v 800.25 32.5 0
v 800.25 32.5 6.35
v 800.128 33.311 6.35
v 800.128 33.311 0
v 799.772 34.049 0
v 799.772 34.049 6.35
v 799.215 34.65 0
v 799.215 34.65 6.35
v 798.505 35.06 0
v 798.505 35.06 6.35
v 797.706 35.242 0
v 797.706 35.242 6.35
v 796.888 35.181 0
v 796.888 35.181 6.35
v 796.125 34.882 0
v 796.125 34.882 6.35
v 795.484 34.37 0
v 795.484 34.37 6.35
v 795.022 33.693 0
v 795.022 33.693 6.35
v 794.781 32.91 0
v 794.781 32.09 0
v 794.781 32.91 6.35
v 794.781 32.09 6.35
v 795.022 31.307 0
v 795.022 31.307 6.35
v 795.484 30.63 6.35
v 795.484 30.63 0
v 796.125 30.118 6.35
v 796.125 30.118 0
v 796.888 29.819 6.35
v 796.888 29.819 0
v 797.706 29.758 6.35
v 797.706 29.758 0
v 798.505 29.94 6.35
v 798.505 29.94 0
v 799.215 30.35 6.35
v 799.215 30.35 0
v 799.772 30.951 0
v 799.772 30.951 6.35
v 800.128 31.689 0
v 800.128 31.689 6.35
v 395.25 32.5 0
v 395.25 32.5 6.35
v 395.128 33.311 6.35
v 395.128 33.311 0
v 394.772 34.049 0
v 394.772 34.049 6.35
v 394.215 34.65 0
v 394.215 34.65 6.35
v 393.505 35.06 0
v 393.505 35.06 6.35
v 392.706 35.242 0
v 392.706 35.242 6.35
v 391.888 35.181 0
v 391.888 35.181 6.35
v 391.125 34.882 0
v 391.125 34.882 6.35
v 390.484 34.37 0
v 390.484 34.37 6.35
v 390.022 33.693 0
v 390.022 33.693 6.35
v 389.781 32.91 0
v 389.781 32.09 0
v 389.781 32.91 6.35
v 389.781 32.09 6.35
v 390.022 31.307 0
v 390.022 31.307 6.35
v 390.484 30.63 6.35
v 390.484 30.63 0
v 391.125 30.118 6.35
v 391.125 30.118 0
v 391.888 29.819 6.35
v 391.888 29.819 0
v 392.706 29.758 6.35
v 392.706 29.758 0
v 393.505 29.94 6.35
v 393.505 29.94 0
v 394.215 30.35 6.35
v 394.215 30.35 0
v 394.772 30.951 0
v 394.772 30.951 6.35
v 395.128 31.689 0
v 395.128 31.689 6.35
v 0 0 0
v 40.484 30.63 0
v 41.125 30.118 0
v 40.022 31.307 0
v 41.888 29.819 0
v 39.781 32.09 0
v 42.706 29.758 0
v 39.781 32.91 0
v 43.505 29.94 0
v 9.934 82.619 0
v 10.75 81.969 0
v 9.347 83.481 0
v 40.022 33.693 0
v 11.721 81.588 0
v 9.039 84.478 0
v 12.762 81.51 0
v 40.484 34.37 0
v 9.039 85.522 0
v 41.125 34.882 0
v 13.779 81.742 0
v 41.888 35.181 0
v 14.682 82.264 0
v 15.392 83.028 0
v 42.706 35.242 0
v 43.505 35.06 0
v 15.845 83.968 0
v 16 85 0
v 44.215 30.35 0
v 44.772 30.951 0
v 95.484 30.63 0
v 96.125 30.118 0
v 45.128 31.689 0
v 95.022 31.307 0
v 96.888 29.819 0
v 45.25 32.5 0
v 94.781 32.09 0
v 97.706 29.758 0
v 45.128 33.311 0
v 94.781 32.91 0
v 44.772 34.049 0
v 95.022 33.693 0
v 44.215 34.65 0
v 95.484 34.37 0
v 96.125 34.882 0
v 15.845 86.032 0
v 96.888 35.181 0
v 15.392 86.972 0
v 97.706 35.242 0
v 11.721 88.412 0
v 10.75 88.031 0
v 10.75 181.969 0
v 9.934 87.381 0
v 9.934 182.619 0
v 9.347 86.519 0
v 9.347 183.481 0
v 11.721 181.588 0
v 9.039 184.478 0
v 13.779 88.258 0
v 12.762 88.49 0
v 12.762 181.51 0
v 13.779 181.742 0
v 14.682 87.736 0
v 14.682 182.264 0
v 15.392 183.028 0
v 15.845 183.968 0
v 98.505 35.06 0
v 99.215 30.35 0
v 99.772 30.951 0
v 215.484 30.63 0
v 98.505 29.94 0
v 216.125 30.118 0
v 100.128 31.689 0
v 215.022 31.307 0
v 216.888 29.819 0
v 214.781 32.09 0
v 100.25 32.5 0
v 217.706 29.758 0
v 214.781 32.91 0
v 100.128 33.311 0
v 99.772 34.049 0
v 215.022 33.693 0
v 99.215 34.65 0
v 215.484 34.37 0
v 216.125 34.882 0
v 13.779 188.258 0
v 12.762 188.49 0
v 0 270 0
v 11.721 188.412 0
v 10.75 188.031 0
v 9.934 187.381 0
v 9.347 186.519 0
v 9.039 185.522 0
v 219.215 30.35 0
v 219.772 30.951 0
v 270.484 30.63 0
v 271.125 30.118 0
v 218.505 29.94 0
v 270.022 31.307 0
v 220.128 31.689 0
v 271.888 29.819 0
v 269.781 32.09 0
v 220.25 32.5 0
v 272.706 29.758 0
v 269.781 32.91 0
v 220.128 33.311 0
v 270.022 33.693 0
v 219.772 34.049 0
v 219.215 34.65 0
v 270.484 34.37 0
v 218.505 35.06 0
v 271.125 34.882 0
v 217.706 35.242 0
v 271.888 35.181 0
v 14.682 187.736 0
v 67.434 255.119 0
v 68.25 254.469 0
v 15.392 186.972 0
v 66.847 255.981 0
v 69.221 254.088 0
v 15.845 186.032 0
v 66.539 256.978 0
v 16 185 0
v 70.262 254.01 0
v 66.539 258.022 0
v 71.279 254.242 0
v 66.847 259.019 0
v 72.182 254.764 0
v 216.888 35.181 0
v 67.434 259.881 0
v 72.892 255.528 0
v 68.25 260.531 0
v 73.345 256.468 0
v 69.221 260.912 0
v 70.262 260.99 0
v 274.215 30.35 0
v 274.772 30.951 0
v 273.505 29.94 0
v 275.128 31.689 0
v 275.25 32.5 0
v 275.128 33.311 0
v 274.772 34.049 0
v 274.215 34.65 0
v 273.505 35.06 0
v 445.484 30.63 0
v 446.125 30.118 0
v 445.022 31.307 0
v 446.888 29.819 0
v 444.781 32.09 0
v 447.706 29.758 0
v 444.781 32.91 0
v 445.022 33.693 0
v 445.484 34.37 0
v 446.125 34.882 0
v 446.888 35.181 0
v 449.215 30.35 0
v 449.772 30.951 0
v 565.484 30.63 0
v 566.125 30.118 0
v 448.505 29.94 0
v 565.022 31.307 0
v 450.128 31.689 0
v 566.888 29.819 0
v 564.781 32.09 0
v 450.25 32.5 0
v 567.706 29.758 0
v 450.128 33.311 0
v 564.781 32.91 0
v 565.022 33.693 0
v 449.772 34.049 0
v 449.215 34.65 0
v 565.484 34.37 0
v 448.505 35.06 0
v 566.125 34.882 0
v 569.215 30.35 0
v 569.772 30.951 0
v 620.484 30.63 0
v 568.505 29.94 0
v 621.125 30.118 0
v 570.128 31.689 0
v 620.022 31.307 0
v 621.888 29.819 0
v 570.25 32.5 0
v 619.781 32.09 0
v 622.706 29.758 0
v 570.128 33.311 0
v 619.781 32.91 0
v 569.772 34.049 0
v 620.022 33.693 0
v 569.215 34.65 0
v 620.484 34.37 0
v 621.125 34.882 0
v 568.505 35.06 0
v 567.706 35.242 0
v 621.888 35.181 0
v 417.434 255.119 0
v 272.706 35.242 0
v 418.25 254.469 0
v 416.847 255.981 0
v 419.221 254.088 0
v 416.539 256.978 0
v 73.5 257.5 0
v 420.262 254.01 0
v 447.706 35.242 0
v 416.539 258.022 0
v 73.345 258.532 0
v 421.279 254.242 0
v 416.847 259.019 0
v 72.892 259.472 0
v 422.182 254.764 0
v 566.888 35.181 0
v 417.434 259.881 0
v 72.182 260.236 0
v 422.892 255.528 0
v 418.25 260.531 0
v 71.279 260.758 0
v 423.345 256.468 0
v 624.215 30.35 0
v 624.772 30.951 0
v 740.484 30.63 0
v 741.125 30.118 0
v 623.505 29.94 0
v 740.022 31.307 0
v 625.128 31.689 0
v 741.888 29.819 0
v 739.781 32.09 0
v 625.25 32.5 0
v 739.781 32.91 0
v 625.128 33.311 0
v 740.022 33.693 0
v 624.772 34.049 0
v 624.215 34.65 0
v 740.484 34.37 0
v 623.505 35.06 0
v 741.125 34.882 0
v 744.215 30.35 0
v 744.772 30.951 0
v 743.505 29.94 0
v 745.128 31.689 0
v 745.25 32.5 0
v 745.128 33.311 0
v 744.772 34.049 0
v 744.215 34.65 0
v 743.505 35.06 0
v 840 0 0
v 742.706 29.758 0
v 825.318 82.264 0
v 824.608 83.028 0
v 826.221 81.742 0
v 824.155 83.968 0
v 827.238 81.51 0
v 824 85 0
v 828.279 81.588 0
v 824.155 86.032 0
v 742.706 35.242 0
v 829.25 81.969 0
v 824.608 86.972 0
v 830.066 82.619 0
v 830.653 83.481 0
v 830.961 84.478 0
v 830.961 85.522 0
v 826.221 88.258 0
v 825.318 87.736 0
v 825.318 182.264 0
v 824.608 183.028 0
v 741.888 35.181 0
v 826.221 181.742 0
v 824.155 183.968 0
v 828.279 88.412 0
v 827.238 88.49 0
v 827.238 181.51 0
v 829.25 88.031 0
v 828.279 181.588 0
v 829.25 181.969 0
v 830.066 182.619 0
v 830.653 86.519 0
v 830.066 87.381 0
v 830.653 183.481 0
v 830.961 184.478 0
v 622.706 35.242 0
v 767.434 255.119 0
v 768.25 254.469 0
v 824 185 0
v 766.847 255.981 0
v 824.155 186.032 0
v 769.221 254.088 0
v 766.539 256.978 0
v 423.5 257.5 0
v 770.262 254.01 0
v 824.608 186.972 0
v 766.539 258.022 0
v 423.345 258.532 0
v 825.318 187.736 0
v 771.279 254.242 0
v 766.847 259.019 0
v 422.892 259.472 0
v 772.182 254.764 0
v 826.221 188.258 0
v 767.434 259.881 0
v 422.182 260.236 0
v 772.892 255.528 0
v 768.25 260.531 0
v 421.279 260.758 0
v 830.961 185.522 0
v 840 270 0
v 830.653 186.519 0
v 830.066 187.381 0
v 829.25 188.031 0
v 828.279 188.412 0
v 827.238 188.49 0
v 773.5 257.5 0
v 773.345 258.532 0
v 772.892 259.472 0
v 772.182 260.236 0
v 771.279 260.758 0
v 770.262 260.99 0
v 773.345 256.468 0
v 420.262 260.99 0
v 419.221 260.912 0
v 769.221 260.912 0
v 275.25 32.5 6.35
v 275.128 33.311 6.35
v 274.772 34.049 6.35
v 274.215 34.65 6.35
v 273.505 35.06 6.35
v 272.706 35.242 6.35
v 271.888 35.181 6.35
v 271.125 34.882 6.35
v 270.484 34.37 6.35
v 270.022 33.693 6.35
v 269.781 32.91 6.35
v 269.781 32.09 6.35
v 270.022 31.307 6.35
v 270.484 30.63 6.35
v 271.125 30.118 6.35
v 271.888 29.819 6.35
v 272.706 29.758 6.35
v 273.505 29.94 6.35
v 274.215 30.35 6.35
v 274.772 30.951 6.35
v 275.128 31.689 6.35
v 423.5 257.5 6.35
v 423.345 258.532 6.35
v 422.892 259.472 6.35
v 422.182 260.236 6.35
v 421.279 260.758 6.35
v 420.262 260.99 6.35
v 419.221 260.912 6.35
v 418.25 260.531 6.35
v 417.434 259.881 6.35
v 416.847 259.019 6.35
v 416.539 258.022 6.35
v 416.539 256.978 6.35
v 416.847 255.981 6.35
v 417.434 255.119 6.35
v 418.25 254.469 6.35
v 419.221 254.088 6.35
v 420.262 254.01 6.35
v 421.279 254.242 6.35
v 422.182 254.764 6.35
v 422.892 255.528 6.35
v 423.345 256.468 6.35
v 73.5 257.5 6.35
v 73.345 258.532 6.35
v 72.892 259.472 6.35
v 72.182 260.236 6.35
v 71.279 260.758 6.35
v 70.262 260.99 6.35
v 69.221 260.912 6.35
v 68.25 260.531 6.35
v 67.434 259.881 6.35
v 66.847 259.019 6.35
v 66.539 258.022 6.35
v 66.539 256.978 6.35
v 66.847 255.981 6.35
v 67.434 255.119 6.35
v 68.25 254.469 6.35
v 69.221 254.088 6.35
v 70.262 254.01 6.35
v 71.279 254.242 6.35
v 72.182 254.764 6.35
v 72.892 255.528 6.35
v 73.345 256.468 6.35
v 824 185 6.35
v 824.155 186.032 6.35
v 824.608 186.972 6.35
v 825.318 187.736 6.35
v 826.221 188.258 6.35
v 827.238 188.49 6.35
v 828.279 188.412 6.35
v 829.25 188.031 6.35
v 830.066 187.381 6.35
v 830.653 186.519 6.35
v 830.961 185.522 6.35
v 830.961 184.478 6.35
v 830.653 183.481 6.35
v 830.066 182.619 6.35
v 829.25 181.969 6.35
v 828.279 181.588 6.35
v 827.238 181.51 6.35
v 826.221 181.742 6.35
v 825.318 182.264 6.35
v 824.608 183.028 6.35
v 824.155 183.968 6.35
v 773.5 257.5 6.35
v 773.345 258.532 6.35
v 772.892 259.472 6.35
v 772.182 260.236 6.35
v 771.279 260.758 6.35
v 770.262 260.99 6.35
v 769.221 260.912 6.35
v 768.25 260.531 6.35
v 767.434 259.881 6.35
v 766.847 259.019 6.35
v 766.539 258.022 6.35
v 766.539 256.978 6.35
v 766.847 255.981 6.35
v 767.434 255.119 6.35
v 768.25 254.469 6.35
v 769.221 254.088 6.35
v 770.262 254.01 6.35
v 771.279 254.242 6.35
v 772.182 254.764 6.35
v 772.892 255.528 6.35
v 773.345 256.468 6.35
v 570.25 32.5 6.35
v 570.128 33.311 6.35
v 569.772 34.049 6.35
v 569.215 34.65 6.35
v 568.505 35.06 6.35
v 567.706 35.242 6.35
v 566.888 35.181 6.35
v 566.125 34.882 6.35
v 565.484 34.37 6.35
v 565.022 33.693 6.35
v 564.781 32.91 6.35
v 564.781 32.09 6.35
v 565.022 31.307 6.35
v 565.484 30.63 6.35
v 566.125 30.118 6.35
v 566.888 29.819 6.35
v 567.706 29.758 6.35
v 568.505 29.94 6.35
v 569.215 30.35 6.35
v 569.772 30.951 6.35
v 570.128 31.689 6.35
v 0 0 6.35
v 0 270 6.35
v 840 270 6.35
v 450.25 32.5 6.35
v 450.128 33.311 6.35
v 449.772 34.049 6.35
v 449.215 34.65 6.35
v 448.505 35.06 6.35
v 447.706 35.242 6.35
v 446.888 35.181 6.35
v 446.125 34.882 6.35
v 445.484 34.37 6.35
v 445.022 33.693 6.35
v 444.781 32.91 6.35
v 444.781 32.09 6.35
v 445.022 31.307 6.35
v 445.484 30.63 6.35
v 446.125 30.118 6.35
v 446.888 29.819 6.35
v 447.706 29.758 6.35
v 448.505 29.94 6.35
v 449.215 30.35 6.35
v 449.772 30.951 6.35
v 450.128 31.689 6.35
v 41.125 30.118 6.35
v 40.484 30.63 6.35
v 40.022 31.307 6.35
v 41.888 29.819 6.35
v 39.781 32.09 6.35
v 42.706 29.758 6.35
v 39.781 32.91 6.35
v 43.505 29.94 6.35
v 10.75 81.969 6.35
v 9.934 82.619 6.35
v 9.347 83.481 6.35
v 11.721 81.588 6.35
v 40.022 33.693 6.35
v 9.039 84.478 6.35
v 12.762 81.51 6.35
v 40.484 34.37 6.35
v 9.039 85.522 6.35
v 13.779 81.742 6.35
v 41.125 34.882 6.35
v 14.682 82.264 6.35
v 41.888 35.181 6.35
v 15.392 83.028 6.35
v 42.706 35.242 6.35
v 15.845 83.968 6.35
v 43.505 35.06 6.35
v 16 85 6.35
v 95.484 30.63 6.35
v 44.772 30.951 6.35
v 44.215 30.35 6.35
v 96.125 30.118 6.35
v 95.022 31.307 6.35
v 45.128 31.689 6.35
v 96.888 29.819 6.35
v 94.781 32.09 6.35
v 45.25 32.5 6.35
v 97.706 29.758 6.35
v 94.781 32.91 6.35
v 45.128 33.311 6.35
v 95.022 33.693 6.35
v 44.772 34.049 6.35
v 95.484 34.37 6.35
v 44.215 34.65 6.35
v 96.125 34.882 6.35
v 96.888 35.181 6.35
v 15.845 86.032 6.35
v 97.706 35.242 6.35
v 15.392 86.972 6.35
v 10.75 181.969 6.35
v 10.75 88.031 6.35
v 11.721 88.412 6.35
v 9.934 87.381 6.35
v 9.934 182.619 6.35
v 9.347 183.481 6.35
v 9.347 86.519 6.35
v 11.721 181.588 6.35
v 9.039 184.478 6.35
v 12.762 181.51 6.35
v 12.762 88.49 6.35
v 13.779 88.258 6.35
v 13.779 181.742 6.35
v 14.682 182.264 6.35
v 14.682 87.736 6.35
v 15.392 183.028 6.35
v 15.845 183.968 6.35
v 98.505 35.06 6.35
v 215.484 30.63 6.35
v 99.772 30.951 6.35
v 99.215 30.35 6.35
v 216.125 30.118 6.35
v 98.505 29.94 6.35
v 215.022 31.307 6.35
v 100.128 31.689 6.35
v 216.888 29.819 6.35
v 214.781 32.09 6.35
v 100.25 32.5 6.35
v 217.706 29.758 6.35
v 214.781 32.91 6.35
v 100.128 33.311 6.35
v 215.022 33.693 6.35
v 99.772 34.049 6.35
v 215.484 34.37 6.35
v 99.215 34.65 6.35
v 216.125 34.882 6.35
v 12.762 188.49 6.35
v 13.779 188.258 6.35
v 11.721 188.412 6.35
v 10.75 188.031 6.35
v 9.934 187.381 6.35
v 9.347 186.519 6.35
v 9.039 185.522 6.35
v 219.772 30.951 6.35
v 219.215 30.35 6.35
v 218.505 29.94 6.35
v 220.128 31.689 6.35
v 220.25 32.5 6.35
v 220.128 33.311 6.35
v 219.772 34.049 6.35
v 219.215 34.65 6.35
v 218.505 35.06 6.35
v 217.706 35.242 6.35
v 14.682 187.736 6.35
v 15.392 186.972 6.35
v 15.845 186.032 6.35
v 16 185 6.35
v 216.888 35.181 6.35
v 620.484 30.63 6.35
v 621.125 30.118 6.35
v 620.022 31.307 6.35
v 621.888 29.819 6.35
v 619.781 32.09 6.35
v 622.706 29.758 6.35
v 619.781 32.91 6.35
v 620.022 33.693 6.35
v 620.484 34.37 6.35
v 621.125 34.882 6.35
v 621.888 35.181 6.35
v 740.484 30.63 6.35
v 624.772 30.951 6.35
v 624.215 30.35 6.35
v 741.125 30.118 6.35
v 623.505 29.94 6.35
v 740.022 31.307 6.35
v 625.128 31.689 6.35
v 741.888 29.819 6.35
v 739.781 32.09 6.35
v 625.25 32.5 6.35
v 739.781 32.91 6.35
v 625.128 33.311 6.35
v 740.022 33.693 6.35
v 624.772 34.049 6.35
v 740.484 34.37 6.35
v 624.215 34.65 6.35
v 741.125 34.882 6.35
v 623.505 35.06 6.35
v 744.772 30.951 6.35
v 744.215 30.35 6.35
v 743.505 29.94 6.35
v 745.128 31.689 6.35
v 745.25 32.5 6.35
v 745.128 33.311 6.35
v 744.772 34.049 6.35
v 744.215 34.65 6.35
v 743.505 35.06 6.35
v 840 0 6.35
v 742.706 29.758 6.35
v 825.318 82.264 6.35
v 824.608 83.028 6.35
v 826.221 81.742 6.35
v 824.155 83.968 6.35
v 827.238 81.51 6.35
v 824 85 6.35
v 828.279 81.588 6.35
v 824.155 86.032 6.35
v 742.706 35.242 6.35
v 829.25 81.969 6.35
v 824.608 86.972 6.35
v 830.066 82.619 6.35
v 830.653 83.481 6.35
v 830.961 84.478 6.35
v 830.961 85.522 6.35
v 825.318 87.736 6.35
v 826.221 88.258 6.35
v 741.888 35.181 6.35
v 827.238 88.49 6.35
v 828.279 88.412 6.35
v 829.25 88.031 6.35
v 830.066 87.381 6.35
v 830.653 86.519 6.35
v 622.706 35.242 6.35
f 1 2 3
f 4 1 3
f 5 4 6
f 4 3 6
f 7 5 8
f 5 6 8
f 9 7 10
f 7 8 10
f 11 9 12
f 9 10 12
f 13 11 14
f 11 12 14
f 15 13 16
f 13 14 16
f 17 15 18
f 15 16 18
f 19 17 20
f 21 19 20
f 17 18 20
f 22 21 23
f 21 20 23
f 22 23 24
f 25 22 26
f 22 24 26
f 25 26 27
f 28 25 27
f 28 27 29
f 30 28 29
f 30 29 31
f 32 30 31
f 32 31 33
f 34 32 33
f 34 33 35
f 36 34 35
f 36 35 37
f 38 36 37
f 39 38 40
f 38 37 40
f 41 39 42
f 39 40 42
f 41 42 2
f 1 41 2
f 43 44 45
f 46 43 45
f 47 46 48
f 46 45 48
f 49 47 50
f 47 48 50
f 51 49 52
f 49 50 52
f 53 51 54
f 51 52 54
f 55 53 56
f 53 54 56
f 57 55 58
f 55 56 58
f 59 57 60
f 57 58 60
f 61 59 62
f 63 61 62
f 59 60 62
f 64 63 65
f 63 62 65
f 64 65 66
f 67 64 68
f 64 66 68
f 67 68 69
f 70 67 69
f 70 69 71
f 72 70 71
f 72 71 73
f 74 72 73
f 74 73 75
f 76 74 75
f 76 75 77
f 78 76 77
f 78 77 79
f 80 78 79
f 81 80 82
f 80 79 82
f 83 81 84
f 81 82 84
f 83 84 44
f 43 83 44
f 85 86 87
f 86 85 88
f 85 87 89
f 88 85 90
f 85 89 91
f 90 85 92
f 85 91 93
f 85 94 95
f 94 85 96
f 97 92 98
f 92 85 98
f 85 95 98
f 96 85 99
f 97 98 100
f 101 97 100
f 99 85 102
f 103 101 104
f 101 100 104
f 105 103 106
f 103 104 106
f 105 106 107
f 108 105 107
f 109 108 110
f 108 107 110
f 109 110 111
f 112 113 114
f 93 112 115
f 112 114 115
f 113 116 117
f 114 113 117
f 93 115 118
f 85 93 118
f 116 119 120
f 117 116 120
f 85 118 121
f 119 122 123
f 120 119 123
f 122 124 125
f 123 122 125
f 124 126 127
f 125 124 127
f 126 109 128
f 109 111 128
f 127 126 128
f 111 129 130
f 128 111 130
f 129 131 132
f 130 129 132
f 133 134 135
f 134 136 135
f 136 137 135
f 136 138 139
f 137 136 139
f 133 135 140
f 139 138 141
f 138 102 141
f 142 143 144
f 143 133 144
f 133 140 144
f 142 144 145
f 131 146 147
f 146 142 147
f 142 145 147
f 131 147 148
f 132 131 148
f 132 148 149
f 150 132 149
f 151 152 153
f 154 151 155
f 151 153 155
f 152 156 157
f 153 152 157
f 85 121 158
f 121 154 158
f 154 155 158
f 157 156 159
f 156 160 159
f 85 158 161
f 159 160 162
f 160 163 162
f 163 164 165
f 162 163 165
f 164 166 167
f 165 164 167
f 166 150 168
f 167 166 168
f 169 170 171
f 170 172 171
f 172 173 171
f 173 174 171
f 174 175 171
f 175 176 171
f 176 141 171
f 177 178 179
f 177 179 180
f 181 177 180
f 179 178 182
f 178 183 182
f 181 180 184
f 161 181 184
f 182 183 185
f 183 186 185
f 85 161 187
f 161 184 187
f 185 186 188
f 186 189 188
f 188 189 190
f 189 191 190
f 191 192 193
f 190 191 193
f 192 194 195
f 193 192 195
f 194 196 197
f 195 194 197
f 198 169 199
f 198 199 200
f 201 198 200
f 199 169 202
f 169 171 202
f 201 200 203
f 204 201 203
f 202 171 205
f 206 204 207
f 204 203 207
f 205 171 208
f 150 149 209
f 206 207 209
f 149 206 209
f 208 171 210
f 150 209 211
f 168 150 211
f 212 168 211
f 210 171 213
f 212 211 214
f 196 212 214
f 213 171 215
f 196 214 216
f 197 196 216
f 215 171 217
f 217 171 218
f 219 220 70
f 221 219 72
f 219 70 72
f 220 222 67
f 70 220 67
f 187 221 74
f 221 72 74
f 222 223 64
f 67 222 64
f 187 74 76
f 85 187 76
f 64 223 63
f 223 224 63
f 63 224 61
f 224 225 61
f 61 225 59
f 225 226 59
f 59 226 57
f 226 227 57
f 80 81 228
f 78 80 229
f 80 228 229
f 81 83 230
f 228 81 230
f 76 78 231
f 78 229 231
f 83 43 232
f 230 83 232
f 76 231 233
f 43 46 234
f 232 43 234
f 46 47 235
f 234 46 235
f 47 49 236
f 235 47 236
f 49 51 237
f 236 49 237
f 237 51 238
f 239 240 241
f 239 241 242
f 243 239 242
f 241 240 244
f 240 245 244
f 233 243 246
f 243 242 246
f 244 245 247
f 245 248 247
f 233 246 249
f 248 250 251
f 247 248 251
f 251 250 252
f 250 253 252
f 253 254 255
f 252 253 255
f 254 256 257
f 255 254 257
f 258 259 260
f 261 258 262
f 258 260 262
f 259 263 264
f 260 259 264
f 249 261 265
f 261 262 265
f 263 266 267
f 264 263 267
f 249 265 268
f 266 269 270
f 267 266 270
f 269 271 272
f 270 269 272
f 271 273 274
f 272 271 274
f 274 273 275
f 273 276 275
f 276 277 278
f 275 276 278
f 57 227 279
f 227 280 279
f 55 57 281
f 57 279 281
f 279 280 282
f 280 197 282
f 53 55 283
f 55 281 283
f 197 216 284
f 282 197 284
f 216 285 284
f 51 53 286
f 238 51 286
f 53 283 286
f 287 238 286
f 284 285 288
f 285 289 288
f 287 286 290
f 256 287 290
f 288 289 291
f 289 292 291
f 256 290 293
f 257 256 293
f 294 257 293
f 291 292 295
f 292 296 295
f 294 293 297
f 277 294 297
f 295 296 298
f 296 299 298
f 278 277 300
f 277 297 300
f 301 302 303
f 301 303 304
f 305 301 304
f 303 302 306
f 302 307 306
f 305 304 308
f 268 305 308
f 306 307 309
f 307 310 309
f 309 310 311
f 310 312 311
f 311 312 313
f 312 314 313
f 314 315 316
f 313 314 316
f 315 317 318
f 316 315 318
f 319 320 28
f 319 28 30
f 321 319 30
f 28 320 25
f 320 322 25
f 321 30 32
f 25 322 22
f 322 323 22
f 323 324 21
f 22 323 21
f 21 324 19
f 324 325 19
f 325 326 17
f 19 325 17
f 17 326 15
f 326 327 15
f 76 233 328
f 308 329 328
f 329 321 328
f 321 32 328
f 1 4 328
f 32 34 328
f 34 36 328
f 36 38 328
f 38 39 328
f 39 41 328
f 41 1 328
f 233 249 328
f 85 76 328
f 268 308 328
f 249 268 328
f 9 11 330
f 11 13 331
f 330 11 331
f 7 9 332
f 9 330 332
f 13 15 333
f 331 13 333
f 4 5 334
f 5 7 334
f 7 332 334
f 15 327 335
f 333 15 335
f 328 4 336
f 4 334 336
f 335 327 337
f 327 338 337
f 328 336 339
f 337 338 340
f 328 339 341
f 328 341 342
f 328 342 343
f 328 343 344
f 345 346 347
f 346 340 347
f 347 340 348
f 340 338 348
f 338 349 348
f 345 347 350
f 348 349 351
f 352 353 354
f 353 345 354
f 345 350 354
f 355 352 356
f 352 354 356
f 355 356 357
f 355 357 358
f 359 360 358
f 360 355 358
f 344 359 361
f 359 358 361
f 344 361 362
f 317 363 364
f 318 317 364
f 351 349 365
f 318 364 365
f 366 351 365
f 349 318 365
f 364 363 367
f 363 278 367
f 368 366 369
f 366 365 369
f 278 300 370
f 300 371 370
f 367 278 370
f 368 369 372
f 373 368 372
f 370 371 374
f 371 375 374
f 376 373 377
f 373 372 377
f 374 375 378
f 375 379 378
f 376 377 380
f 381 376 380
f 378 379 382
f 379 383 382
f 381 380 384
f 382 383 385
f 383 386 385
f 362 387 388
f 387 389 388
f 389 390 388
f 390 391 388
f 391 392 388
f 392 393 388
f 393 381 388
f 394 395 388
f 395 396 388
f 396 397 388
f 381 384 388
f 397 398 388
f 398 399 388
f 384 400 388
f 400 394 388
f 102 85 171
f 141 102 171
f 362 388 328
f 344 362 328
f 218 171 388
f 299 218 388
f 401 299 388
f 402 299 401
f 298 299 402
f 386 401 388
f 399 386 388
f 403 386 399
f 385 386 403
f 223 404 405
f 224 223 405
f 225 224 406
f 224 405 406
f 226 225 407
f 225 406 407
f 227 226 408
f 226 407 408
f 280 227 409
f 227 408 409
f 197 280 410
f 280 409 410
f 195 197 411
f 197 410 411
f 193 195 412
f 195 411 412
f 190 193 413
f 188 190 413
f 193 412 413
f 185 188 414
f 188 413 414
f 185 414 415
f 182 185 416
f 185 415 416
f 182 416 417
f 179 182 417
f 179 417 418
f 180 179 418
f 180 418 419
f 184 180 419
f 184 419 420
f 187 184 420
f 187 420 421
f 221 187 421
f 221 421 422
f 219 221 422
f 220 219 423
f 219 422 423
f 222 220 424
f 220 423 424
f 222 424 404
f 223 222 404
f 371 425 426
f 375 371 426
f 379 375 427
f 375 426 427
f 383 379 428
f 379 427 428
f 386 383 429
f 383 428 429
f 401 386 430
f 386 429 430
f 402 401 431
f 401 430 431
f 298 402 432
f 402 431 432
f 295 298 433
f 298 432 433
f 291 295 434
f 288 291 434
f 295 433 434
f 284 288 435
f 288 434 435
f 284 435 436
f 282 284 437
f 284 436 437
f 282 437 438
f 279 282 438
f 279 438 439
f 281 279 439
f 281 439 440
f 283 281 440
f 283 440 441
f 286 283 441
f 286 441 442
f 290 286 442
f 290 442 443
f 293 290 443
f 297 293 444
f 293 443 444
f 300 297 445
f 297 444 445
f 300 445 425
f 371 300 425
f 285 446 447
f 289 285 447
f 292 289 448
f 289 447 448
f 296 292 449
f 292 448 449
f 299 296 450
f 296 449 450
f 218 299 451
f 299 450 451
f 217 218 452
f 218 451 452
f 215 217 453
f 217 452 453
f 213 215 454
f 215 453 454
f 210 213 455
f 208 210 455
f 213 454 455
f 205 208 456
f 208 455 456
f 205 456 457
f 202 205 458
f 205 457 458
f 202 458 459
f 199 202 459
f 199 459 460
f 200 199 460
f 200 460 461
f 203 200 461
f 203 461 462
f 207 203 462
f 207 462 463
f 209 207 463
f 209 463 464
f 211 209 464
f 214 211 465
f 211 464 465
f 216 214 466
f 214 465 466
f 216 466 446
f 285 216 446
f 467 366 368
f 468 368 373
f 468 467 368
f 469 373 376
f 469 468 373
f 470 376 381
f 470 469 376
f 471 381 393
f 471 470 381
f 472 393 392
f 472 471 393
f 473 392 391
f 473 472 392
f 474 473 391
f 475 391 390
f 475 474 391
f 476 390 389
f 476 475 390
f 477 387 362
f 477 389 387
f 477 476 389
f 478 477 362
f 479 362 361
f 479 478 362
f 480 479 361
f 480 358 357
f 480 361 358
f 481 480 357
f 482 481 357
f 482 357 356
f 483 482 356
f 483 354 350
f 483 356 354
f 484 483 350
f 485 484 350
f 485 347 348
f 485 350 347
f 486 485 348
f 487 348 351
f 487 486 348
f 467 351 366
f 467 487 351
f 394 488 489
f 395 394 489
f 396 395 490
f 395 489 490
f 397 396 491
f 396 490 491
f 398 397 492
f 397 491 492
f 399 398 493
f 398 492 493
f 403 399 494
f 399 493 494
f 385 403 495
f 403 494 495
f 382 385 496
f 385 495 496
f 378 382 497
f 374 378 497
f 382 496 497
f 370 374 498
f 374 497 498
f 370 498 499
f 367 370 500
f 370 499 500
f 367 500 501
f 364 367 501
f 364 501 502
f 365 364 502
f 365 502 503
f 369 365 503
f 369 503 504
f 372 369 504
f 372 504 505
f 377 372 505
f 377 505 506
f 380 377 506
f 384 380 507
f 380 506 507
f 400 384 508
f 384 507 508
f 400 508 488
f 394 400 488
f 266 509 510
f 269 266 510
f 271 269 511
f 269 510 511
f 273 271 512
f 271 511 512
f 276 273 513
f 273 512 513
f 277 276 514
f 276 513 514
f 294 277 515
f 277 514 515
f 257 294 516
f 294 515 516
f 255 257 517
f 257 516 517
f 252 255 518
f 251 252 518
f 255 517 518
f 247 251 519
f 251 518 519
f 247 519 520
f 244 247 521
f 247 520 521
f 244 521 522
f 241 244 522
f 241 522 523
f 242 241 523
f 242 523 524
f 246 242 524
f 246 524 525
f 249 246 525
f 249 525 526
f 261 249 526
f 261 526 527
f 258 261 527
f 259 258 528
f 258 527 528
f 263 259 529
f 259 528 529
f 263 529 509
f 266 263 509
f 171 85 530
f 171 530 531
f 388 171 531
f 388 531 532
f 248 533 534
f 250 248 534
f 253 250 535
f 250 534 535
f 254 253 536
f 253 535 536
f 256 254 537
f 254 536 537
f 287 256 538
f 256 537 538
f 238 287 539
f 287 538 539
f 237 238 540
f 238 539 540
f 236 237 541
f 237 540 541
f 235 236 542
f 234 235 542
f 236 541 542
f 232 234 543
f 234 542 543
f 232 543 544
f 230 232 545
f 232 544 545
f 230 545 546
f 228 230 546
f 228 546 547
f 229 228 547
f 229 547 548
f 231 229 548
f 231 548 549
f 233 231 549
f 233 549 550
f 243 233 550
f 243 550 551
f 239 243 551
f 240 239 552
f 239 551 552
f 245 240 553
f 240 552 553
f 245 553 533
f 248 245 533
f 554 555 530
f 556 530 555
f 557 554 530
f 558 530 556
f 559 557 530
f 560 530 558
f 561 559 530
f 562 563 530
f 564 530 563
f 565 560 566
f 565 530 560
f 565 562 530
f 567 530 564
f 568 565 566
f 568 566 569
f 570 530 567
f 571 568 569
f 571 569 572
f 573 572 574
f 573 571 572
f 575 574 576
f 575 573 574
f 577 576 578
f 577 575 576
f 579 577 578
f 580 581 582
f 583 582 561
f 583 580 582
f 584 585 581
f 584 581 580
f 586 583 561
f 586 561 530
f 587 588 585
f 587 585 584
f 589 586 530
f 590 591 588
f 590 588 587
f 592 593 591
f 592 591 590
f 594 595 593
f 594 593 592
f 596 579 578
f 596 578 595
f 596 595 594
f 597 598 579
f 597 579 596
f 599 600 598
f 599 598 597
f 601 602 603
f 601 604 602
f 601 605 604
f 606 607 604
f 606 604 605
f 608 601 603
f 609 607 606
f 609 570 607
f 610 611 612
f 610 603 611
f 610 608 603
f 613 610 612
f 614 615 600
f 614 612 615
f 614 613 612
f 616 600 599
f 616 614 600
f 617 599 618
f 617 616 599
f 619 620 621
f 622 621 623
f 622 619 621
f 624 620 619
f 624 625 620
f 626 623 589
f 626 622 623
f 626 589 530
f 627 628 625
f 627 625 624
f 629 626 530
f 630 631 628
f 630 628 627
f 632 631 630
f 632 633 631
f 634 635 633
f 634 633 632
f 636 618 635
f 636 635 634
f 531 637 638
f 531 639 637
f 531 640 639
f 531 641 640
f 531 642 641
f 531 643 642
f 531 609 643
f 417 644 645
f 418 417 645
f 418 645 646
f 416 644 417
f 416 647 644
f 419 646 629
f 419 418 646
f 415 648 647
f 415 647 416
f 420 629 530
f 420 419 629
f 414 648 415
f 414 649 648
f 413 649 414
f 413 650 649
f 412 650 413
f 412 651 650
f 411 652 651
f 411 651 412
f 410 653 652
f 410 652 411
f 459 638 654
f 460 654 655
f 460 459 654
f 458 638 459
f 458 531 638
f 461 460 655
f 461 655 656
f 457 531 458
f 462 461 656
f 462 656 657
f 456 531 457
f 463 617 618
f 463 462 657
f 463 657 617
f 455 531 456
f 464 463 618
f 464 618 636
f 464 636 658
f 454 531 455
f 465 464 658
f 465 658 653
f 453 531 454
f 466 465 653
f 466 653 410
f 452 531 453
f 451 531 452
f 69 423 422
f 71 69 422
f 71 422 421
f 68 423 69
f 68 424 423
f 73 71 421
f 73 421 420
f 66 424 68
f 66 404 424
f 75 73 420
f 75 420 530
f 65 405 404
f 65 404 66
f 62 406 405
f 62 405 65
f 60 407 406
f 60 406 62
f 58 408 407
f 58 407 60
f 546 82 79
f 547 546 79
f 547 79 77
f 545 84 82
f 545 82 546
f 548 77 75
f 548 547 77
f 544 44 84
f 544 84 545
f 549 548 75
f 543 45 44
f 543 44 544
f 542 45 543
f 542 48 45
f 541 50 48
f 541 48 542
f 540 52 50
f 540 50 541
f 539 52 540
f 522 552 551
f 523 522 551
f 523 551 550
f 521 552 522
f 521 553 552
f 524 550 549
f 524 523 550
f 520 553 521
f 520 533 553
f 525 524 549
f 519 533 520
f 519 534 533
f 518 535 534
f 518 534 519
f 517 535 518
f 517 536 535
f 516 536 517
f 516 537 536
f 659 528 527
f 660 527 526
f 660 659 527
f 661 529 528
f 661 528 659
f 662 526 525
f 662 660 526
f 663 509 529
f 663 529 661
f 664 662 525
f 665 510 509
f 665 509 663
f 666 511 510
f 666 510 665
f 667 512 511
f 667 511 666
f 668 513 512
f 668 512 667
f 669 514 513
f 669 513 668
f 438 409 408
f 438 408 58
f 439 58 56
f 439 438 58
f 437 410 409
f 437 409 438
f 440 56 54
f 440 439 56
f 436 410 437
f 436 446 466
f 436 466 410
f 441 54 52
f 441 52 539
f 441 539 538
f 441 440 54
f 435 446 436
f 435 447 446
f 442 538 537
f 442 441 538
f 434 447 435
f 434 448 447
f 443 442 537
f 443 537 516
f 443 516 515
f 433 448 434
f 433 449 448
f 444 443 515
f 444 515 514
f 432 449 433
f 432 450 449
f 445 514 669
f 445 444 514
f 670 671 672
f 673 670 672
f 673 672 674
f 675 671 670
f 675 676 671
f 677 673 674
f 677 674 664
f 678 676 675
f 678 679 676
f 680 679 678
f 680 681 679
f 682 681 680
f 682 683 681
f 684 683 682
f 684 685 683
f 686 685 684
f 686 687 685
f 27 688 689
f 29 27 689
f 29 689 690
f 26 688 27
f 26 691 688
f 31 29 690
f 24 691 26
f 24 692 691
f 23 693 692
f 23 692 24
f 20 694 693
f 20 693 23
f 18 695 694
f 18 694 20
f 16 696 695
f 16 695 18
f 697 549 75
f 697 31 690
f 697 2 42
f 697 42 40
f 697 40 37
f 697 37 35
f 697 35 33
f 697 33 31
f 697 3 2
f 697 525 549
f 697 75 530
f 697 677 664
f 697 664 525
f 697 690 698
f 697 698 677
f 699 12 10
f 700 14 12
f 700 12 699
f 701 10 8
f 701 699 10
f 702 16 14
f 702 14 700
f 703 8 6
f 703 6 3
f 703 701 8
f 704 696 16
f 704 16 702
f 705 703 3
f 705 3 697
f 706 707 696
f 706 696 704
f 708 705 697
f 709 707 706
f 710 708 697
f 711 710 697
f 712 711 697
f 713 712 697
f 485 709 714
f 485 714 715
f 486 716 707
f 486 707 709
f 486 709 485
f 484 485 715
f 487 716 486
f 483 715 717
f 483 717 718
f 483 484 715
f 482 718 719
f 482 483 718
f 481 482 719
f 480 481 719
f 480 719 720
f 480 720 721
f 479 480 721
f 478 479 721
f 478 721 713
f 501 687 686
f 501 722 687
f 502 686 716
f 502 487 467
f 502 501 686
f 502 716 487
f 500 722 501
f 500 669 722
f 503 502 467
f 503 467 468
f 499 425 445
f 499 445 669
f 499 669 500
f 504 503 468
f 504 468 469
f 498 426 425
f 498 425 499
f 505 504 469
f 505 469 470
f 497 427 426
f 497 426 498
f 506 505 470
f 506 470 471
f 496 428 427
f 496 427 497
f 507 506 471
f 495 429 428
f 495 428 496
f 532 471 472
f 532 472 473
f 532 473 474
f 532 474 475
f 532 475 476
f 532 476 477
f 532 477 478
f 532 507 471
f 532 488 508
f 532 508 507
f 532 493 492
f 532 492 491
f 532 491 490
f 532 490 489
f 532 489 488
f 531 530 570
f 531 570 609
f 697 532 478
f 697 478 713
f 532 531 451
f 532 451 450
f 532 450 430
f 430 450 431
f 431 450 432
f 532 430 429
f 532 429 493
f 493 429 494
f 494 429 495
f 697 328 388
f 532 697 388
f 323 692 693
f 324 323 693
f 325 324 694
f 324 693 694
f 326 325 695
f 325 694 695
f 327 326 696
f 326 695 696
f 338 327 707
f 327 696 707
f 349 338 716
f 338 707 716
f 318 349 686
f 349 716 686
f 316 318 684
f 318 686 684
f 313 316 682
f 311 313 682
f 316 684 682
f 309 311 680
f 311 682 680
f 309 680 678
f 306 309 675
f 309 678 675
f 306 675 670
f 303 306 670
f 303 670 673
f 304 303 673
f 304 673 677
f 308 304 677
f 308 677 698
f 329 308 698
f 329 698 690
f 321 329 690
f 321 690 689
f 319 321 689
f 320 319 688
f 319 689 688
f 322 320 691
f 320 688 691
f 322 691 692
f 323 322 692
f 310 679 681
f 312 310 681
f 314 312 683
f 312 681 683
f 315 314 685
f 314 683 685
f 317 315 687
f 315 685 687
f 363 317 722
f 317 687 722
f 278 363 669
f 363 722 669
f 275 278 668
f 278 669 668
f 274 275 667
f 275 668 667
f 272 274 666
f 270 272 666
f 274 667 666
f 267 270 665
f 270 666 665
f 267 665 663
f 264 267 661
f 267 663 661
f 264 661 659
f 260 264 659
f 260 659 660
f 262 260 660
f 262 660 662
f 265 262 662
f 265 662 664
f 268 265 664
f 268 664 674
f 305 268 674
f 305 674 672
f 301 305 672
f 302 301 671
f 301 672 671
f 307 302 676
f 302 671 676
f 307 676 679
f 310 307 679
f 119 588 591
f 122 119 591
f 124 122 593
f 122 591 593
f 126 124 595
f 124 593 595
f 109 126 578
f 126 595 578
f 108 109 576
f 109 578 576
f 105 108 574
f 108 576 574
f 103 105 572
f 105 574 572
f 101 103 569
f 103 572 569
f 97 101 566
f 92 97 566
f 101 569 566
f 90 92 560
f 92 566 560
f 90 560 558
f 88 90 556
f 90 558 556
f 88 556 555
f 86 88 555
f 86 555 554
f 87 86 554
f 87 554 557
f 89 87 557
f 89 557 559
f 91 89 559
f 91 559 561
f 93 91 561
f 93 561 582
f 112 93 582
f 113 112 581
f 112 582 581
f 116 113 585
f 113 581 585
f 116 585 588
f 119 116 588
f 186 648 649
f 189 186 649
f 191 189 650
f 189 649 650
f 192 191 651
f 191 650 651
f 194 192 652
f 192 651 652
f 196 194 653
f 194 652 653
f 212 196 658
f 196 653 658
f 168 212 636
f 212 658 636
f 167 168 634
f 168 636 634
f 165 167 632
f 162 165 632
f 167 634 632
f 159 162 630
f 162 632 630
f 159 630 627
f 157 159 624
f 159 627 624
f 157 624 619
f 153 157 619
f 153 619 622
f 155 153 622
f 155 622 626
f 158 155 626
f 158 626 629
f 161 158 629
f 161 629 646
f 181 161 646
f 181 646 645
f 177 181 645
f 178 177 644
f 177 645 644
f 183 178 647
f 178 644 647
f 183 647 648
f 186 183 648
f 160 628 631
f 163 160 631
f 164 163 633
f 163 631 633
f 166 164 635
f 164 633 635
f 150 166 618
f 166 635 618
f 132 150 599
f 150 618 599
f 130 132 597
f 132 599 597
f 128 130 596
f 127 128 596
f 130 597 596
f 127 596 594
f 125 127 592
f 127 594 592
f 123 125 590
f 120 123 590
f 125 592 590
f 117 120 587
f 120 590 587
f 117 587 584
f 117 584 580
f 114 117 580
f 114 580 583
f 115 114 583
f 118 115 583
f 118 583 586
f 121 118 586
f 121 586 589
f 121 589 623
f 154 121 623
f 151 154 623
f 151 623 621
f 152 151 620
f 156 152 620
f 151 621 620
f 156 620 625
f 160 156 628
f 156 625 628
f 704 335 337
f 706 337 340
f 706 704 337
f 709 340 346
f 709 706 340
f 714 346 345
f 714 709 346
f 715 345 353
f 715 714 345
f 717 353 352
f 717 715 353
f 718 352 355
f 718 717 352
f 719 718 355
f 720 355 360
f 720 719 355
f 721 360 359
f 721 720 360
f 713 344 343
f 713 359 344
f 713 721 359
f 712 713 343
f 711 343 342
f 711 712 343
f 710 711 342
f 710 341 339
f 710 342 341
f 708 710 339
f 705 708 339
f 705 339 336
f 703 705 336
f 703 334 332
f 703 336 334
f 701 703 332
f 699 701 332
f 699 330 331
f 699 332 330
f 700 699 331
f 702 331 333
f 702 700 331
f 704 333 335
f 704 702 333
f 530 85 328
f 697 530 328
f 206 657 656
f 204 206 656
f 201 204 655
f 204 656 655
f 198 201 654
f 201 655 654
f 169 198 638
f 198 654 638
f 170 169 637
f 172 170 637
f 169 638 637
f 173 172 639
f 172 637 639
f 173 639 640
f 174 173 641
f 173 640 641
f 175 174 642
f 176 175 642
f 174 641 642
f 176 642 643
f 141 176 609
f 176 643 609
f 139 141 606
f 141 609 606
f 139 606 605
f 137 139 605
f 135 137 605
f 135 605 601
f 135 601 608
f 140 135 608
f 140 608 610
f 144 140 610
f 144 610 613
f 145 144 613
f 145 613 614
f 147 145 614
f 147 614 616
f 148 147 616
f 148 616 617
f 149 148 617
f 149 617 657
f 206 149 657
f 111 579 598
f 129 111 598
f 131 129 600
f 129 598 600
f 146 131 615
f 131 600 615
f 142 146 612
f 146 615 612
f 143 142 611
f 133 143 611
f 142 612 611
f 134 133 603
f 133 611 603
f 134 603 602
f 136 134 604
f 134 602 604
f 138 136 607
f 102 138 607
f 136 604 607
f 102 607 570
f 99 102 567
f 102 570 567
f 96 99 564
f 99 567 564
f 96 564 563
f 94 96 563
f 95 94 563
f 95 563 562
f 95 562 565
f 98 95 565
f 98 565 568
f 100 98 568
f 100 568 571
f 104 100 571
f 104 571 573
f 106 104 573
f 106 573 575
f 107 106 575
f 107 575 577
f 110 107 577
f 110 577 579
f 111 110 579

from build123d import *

# Parameters (mm, degrees)
SKETCH1_W           = 840
SKETCH1_H           = 270
BOSS_EXTRUDE1_DEPTH = 6.35
SKETCH2_R           = 3.5
SKETCH2_R_2         = 2.75
CUT_EXTRUDE1_DEPTH  = 883.349319997


with BuildPart() as part:
    # Sketch1 → Boss-Extrude1 (new body)
    with BuildSketch(Plane.XY):
        with Locations((420, 135)):
            Rectangle(SKETCH1_W, SKETCH1_H)
    extrude(amount=BOSS_EXTRUDE1_DEPTH)

    # Sketch2 → Cut-Extrude1 (cut, symmetric)
    with BuildSketch(Plane.XY.offset(6.35)):
        with Locations((70, 257.5)):
            Circle(SKETCH2_R)
        with Locations((420, 257.5)):
            Circle(SKETCH2_R)
        with Locations((770, 257.5)):
            Circle(SKETCH2_R)
        with Locations((12.5, 185)):
            Circle(SKETCH2_R)
        with Locations((12.5, 85)):
            Circle(SKETCH2_R)
        with Locations((392.5, 32.5)):
            Circle(SKETCH2_R_2)
        with Locations((447.5, 32.5)):
            Circle(SKETCH2_R_2)
        with Locations((567.5, 32.5)):
            Circle(SKETCH2_R_2)
        with Locations((622.5, 32.5)):
            Circle(SKETCH2_R_2)
        with Locations((742.5, 32.5)):
            Circle(SKETCH2_R_2)
        with Locations((797.5, 32.5)):
            Circle(SKETCH2_R_2)
        with Locations((217.5, 32.5)):
            Circle(SKETCH2_R_2)
        with Locations((272.5, 32.5)):
            Circle(SKETCH2_R_2)
        with Locations((42.5, 32.5)):
            Circle(SKETCH2_R_2)
        with Locations((97.5, 32.5)):
            Circle(SKETCH2_R_2)
    cut_extrude1 = extrude(amount=CUT_EXTRUDE1_DEPTH, both=True, mode=Mode.SUBTRACT)

    # Mirror1: Cut-Extrude1 across plane
    add(cut_extrude1.mirror(Plane.ZY.offset(-420)), mode=Mode.SUBTRACT)


solid = part.part
